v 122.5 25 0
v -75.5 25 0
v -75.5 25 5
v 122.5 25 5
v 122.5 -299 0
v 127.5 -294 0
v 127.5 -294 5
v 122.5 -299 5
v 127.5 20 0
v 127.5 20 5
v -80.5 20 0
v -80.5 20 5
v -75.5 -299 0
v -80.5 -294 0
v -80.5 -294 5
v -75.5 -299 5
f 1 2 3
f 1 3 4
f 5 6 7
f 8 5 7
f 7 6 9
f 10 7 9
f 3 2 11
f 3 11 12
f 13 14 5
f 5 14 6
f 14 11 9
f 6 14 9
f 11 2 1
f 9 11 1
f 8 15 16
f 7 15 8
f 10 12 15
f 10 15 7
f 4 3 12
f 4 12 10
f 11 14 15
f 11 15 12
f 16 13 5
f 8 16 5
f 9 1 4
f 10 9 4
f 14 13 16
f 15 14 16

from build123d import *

# Parameters (mm, degrees)
SKETCH1_W           = 208
SKETCH1_H           = 324
BOSS_EXTRUDE1_DEPTH = 5
CHAMFER1_SIZE       = 5


with BuildPart() as part:
    # Sketch1 → Boss-Extrude1 (new body)
    with BuildSketch(Plane.XY):
        with Locations((23.5, -137)):
            Rectangle(SKETCH1_W, SKETCH1_H)
    extrude(amount=BOSS_EXTRUDE1_DEPTH)

    # Chamfer1
    chamfer1_edges = [part.edges().sort_by_distance(p)[0] for p in [
        (-80.5, 25, 2.5),
        (127.5, 25, 2.5),
        (127.5, -299, 2.5),
        (-80.5, -299, 2.5),
    ]]
    chamfer(chamfer1_edges, length=CHAMFER1_SIZE)


solid = part.part
